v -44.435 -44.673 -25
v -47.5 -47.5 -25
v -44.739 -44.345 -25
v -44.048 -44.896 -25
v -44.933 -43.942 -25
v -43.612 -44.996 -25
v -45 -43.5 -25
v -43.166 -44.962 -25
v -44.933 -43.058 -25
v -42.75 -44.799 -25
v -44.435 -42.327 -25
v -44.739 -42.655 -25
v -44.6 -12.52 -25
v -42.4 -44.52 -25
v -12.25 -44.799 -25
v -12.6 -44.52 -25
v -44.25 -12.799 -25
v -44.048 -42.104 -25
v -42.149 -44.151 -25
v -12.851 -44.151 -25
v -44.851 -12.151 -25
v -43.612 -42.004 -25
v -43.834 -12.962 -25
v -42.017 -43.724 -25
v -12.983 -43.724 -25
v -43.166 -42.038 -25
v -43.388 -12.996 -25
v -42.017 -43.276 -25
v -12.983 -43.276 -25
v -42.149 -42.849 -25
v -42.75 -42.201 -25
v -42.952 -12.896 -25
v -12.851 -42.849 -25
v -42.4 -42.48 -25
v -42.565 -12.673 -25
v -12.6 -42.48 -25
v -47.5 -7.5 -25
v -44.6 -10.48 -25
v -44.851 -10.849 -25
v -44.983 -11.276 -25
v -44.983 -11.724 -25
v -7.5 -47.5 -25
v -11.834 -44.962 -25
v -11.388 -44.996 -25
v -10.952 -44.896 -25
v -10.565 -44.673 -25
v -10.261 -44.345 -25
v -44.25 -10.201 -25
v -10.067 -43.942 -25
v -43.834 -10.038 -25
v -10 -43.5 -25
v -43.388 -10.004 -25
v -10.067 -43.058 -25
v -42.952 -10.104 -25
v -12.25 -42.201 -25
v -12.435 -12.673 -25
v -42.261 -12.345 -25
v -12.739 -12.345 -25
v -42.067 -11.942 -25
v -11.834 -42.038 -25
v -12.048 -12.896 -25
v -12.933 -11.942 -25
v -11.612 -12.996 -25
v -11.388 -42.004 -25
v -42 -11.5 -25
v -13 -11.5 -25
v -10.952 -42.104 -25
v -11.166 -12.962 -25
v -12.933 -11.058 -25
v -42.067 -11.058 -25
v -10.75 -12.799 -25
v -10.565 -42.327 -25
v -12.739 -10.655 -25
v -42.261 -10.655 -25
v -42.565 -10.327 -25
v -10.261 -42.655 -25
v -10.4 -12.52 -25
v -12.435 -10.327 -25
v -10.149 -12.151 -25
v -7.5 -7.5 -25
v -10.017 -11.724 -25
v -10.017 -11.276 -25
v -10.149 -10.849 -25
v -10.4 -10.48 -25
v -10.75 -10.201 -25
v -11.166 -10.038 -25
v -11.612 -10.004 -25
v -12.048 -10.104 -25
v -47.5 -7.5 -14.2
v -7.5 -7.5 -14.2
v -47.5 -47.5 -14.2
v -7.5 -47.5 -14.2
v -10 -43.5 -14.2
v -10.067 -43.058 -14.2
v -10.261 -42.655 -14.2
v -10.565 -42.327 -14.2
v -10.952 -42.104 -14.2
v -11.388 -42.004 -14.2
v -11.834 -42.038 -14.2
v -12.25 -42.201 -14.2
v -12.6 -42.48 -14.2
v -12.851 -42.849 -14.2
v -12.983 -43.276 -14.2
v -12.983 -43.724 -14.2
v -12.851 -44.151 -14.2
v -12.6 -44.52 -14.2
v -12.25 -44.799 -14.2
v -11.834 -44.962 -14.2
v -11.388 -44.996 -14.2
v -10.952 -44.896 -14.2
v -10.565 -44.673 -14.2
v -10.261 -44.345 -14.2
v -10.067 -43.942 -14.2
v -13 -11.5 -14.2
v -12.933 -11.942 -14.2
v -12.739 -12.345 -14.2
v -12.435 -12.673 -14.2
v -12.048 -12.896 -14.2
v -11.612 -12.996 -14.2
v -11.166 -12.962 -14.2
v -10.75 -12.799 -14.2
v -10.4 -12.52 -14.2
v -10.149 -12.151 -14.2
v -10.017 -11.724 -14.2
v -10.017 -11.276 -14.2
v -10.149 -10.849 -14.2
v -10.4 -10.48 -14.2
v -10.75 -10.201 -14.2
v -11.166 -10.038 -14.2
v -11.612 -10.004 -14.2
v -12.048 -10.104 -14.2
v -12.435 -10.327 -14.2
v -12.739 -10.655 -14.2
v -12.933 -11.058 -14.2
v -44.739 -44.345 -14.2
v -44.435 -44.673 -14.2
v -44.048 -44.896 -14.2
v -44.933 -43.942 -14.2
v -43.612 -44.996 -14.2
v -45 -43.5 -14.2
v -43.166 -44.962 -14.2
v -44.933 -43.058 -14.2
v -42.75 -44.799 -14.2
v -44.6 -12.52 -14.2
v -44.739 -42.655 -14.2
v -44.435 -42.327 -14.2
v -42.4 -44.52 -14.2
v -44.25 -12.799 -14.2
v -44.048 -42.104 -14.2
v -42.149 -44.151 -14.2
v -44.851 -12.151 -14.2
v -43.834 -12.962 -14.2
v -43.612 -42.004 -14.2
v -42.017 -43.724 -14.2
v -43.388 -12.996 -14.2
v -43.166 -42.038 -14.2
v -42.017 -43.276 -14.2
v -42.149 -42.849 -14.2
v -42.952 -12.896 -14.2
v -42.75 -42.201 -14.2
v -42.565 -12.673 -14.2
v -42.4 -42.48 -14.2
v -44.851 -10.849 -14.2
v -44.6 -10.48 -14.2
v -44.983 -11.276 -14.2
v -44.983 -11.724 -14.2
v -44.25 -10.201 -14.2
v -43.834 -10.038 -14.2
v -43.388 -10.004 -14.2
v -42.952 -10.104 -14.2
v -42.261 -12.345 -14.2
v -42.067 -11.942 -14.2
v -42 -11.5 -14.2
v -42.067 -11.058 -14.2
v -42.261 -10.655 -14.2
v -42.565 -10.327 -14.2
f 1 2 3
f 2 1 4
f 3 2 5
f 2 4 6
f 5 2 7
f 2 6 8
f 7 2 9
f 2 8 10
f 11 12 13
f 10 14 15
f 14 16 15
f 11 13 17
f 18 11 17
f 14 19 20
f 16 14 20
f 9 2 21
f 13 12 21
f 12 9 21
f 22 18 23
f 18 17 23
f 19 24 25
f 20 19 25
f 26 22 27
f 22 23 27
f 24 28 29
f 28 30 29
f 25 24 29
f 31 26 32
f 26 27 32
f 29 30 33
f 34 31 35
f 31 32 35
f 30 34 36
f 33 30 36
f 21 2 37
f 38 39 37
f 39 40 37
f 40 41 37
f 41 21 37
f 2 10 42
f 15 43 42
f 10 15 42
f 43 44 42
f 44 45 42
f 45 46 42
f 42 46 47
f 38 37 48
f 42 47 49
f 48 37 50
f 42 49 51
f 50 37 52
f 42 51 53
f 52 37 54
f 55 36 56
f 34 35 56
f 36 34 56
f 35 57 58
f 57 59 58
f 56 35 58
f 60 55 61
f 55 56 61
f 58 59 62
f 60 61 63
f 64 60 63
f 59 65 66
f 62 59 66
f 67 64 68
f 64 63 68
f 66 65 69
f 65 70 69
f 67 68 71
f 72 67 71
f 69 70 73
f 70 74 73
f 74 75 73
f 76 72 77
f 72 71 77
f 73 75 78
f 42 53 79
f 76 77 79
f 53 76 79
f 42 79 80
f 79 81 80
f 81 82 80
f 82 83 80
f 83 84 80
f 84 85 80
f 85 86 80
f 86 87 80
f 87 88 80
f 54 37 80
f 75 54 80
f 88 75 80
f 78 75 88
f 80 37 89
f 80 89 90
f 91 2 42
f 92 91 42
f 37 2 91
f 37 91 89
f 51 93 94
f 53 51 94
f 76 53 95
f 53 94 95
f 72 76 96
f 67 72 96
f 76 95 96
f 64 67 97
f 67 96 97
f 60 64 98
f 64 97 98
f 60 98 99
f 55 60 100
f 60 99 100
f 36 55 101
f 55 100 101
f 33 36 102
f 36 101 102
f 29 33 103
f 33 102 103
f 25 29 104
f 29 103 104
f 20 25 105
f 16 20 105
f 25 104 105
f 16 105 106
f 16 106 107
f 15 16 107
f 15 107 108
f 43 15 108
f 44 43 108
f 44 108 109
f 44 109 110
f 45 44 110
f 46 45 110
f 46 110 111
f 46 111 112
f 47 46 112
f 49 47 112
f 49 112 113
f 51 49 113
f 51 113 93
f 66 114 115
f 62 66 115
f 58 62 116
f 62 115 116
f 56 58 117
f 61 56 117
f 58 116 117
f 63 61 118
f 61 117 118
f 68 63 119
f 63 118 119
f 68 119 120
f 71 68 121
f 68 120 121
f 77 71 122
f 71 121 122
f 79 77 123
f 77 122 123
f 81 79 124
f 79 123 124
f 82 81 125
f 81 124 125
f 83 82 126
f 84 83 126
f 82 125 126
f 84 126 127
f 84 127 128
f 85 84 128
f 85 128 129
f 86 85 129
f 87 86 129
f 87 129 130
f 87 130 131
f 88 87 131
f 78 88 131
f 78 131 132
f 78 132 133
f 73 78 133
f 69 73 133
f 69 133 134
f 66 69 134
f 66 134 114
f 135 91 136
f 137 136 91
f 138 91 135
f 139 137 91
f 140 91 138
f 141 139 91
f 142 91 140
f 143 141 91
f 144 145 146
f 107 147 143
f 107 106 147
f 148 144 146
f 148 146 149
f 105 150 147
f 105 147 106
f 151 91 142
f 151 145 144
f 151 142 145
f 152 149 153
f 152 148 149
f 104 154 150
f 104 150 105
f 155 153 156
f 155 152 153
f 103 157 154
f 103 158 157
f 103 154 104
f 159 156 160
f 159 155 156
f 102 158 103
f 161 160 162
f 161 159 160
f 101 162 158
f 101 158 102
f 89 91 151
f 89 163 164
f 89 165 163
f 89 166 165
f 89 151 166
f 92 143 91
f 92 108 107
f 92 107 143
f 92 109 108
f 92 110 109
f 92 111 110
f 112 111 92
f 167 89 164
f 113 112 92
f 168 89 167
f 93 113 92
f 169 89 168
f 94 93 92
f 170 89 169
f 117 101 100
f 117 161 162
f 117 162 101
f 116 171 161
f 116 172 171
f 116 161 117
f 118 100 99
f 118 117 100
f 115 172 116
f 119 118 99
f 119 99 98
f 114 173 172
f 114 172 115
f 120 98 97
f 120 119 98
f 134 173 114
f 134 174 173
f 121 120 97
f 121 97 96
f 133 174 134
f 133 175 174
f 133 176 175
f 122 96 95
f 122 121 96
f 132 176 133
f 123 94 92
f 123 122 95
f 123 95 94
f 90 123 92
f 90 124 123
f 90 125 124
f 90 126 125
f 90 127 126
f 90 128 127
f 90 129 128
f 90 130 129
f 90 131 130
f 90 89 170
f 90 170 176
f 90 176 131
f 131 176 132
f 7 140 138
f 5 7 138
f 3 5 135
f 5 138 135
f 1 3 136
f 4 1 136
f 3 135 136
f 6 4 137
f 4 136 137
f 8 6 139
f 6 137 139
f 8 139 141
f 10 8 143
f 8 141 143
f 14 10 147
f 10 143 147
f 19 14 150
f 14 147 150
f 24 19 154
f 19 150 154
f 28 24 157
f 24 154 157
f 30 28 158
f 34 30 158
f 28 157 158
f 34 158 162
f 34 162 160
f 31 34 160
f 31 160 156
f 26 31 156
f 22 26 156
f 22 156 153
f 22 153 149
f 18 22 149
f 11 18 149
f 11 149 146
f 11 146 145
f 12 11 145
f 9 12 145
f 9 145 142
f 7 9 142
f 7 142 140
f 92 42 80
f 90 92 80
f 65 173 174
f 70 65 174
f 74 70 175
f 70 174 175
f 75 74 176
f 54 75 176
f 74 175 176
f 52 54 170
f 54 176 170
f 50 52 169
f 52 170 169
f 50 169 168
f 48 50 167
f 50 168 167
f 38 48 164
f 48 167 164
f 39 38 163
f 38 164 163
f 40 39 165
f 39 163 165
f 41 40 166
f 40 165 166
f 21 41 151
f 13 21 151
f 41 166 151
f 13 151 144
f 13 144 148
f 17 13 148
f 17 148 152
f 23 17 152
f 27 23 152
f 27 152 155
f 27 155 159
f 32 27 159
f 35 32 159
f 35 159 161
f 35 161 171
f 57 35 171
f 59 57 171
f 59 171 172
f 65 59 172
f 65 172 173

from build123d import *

# Parameters (mm, degrees)
LOFT_START          = -25
LOFT_1_OUTLINE_W    = 40
LOFT_1_OUTLINE_H    = 40
LOFT_1_DEPTH        = 10.8
SKETCH_1_R          = 1.5
CUT_EXTRUDE_1_DEPTH = 25


# Read off the part's stored shape, not the designer's step: По сечениям1
with BuildPart() as part:
    # По сечениям1 outline → По сечениям1 (new body)
    with BuildSketch(Plane.XY.offset(LOFT_START)):
        with Locations((-27.5, -27.5)):
            Rectangle(LOFT_1_OUTLINE_W, LOFT_1_OUTLINE_H)
    extrude(amount=LOFT_1_DEPTH)

    # Эскиз1 → Вырез-Вытянуть1 (cut)
    with BuildSketch(Plane.XY.offset(-14.2)):
        with Locations((-43.5, -11.5)):
            Circle(SKETCH_1_R)
        with Locations(Location((-43.5, -43.5, 0), (0, 0, 180))):
            Circle(SKETCH_1_R)
        with Locations(Location((-11.5, -11.5, 0), (0, 0, 180))):
            Circle(SKETCH_1_R)
        with Locations((-11.5, -43.5)):
            Circle(SKETCH_1_R)
    extrude(amount=-CUT_EXTRUDE_1_DEPTH, mode=Mode.SUBTRACT)


solid = part.part
